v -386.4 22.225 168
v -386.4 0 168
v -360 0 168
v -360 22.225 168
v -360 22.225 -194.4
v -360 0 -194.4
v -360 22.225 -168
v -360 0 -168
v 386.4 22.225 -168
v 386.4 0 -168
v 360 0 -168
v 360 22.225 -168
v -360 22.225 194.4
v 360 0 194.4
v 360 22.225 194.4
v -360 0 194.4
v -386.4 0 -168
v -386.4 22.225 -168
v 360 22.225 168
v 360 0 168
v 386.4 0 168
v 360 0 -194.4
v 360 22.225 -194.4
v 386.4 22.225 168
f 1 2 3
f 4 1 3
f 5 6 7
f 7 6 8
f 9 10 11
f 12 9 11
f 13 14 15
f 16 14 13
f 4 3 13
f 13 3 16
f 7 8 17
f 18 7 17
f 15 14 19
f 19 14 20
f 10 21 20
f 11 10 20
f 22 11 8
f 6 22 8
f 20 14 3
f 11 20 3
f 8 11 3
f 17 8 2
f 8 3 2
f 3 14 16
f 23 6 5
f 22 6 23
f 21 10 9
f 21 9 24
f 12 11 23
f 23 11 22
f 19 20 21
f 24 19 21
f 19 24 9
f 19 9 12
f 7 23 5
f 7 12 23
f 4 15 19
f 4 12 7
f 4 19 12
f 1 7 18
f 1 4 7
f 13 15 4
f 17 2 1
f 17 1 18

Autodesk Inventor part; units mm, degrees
ref_plane "YZ Plane" through (0, 0, 0) normal (1, 0, 0) x (0, 1, 0)
ref_plane "XZ Plane" through (0, 0, 0) normal (0, 1, 0) x (-1, 0, 0)
ref_plane "XY Plane" through (0, 0, 0) normal (0, 0, 1) x (1, 0, 0)
sketch "Sketch1" plane through (0, 0, 0) normal (0, 1, 0) x (-1, 0, 0)
  line L0 (386.4, -194.4) -> (-386.4, -194.4)
  line L1 (-386.4, -194.4) -> (-386.4, 194.4)
  line L2 (-386.4, 194.4) -> (386.4, 194.4)
  line L3 (386.4, 194.4) -> (386.4, -194.4)
  point P0 (0, 0)
  point P1 (-386.4, 0)
  point P2 (0, -194.4)
  dimension "d0" = 772.8
  dimension "d1" = 388.8
extrude "Extrusion1" add sketch "Sketch1" along normal blind 22.225
sketch "Sketch2" plane through (0, 22.225, 0) normal (0, 1, 0) x (1, 0, 0)
  point P0 (0, 0)
sketch "Sketch3" plane through (0, 0, 0) normal (0, -1, 0) x (1, 0, 0)
  line L0 (-387.4, -195.4) -> (387.4, -195.4) construction
  line L1 (387.4, -195.4) -> (387.4, 195.4) construction
  line L2 (387.4, 195.4) -> (-387.4, 195.4) construction
  line L3 (-387.4, 195.4) -> (-387.4, -195.4) construction
  line L4 (-386.4, 194.4) -> (386.4, 194.4) construction
  line L5 (-386.4, -194.4) -> (-386.4, 194.4) construction
  point P0 (0, 0)
  point P1 (-387.4, 0)
  point P2 (0, 195.4)
  dimension "d4" = 1
  dimension "d5" = 1
sketch "Sketch4" plane through (0, 0, 0) normal (0, -1, 0) x (1, 0, 0)
  line L0 (386.4, -194.4) -> (-386.4, -194.4) projected
  line L1 (-386.4, -194.4) -> (-360, -194.4)
  line L2 (-360, -194.4) -> (-360, -168)
  line L3 (-360, -168) -> (-386.4, -168)
  line L4 (-386.4, -168) -> (-386.4, -194.4)
  point P0 (0, 0)
  dimension "d6" = 26.4
extrude "Extrusion2" cut sketch "Sketch4" against normal blind 22.225
mirror "Mirror1" about plane through (0, 0, 0) normal (1, 0, 0) of "Extrusion2"
mirror "Mirror2" about plane through (0, 0, 0) normal (0, 0, 1) of "Extrusion2", "Mirror1"
properties part number "shelf"
